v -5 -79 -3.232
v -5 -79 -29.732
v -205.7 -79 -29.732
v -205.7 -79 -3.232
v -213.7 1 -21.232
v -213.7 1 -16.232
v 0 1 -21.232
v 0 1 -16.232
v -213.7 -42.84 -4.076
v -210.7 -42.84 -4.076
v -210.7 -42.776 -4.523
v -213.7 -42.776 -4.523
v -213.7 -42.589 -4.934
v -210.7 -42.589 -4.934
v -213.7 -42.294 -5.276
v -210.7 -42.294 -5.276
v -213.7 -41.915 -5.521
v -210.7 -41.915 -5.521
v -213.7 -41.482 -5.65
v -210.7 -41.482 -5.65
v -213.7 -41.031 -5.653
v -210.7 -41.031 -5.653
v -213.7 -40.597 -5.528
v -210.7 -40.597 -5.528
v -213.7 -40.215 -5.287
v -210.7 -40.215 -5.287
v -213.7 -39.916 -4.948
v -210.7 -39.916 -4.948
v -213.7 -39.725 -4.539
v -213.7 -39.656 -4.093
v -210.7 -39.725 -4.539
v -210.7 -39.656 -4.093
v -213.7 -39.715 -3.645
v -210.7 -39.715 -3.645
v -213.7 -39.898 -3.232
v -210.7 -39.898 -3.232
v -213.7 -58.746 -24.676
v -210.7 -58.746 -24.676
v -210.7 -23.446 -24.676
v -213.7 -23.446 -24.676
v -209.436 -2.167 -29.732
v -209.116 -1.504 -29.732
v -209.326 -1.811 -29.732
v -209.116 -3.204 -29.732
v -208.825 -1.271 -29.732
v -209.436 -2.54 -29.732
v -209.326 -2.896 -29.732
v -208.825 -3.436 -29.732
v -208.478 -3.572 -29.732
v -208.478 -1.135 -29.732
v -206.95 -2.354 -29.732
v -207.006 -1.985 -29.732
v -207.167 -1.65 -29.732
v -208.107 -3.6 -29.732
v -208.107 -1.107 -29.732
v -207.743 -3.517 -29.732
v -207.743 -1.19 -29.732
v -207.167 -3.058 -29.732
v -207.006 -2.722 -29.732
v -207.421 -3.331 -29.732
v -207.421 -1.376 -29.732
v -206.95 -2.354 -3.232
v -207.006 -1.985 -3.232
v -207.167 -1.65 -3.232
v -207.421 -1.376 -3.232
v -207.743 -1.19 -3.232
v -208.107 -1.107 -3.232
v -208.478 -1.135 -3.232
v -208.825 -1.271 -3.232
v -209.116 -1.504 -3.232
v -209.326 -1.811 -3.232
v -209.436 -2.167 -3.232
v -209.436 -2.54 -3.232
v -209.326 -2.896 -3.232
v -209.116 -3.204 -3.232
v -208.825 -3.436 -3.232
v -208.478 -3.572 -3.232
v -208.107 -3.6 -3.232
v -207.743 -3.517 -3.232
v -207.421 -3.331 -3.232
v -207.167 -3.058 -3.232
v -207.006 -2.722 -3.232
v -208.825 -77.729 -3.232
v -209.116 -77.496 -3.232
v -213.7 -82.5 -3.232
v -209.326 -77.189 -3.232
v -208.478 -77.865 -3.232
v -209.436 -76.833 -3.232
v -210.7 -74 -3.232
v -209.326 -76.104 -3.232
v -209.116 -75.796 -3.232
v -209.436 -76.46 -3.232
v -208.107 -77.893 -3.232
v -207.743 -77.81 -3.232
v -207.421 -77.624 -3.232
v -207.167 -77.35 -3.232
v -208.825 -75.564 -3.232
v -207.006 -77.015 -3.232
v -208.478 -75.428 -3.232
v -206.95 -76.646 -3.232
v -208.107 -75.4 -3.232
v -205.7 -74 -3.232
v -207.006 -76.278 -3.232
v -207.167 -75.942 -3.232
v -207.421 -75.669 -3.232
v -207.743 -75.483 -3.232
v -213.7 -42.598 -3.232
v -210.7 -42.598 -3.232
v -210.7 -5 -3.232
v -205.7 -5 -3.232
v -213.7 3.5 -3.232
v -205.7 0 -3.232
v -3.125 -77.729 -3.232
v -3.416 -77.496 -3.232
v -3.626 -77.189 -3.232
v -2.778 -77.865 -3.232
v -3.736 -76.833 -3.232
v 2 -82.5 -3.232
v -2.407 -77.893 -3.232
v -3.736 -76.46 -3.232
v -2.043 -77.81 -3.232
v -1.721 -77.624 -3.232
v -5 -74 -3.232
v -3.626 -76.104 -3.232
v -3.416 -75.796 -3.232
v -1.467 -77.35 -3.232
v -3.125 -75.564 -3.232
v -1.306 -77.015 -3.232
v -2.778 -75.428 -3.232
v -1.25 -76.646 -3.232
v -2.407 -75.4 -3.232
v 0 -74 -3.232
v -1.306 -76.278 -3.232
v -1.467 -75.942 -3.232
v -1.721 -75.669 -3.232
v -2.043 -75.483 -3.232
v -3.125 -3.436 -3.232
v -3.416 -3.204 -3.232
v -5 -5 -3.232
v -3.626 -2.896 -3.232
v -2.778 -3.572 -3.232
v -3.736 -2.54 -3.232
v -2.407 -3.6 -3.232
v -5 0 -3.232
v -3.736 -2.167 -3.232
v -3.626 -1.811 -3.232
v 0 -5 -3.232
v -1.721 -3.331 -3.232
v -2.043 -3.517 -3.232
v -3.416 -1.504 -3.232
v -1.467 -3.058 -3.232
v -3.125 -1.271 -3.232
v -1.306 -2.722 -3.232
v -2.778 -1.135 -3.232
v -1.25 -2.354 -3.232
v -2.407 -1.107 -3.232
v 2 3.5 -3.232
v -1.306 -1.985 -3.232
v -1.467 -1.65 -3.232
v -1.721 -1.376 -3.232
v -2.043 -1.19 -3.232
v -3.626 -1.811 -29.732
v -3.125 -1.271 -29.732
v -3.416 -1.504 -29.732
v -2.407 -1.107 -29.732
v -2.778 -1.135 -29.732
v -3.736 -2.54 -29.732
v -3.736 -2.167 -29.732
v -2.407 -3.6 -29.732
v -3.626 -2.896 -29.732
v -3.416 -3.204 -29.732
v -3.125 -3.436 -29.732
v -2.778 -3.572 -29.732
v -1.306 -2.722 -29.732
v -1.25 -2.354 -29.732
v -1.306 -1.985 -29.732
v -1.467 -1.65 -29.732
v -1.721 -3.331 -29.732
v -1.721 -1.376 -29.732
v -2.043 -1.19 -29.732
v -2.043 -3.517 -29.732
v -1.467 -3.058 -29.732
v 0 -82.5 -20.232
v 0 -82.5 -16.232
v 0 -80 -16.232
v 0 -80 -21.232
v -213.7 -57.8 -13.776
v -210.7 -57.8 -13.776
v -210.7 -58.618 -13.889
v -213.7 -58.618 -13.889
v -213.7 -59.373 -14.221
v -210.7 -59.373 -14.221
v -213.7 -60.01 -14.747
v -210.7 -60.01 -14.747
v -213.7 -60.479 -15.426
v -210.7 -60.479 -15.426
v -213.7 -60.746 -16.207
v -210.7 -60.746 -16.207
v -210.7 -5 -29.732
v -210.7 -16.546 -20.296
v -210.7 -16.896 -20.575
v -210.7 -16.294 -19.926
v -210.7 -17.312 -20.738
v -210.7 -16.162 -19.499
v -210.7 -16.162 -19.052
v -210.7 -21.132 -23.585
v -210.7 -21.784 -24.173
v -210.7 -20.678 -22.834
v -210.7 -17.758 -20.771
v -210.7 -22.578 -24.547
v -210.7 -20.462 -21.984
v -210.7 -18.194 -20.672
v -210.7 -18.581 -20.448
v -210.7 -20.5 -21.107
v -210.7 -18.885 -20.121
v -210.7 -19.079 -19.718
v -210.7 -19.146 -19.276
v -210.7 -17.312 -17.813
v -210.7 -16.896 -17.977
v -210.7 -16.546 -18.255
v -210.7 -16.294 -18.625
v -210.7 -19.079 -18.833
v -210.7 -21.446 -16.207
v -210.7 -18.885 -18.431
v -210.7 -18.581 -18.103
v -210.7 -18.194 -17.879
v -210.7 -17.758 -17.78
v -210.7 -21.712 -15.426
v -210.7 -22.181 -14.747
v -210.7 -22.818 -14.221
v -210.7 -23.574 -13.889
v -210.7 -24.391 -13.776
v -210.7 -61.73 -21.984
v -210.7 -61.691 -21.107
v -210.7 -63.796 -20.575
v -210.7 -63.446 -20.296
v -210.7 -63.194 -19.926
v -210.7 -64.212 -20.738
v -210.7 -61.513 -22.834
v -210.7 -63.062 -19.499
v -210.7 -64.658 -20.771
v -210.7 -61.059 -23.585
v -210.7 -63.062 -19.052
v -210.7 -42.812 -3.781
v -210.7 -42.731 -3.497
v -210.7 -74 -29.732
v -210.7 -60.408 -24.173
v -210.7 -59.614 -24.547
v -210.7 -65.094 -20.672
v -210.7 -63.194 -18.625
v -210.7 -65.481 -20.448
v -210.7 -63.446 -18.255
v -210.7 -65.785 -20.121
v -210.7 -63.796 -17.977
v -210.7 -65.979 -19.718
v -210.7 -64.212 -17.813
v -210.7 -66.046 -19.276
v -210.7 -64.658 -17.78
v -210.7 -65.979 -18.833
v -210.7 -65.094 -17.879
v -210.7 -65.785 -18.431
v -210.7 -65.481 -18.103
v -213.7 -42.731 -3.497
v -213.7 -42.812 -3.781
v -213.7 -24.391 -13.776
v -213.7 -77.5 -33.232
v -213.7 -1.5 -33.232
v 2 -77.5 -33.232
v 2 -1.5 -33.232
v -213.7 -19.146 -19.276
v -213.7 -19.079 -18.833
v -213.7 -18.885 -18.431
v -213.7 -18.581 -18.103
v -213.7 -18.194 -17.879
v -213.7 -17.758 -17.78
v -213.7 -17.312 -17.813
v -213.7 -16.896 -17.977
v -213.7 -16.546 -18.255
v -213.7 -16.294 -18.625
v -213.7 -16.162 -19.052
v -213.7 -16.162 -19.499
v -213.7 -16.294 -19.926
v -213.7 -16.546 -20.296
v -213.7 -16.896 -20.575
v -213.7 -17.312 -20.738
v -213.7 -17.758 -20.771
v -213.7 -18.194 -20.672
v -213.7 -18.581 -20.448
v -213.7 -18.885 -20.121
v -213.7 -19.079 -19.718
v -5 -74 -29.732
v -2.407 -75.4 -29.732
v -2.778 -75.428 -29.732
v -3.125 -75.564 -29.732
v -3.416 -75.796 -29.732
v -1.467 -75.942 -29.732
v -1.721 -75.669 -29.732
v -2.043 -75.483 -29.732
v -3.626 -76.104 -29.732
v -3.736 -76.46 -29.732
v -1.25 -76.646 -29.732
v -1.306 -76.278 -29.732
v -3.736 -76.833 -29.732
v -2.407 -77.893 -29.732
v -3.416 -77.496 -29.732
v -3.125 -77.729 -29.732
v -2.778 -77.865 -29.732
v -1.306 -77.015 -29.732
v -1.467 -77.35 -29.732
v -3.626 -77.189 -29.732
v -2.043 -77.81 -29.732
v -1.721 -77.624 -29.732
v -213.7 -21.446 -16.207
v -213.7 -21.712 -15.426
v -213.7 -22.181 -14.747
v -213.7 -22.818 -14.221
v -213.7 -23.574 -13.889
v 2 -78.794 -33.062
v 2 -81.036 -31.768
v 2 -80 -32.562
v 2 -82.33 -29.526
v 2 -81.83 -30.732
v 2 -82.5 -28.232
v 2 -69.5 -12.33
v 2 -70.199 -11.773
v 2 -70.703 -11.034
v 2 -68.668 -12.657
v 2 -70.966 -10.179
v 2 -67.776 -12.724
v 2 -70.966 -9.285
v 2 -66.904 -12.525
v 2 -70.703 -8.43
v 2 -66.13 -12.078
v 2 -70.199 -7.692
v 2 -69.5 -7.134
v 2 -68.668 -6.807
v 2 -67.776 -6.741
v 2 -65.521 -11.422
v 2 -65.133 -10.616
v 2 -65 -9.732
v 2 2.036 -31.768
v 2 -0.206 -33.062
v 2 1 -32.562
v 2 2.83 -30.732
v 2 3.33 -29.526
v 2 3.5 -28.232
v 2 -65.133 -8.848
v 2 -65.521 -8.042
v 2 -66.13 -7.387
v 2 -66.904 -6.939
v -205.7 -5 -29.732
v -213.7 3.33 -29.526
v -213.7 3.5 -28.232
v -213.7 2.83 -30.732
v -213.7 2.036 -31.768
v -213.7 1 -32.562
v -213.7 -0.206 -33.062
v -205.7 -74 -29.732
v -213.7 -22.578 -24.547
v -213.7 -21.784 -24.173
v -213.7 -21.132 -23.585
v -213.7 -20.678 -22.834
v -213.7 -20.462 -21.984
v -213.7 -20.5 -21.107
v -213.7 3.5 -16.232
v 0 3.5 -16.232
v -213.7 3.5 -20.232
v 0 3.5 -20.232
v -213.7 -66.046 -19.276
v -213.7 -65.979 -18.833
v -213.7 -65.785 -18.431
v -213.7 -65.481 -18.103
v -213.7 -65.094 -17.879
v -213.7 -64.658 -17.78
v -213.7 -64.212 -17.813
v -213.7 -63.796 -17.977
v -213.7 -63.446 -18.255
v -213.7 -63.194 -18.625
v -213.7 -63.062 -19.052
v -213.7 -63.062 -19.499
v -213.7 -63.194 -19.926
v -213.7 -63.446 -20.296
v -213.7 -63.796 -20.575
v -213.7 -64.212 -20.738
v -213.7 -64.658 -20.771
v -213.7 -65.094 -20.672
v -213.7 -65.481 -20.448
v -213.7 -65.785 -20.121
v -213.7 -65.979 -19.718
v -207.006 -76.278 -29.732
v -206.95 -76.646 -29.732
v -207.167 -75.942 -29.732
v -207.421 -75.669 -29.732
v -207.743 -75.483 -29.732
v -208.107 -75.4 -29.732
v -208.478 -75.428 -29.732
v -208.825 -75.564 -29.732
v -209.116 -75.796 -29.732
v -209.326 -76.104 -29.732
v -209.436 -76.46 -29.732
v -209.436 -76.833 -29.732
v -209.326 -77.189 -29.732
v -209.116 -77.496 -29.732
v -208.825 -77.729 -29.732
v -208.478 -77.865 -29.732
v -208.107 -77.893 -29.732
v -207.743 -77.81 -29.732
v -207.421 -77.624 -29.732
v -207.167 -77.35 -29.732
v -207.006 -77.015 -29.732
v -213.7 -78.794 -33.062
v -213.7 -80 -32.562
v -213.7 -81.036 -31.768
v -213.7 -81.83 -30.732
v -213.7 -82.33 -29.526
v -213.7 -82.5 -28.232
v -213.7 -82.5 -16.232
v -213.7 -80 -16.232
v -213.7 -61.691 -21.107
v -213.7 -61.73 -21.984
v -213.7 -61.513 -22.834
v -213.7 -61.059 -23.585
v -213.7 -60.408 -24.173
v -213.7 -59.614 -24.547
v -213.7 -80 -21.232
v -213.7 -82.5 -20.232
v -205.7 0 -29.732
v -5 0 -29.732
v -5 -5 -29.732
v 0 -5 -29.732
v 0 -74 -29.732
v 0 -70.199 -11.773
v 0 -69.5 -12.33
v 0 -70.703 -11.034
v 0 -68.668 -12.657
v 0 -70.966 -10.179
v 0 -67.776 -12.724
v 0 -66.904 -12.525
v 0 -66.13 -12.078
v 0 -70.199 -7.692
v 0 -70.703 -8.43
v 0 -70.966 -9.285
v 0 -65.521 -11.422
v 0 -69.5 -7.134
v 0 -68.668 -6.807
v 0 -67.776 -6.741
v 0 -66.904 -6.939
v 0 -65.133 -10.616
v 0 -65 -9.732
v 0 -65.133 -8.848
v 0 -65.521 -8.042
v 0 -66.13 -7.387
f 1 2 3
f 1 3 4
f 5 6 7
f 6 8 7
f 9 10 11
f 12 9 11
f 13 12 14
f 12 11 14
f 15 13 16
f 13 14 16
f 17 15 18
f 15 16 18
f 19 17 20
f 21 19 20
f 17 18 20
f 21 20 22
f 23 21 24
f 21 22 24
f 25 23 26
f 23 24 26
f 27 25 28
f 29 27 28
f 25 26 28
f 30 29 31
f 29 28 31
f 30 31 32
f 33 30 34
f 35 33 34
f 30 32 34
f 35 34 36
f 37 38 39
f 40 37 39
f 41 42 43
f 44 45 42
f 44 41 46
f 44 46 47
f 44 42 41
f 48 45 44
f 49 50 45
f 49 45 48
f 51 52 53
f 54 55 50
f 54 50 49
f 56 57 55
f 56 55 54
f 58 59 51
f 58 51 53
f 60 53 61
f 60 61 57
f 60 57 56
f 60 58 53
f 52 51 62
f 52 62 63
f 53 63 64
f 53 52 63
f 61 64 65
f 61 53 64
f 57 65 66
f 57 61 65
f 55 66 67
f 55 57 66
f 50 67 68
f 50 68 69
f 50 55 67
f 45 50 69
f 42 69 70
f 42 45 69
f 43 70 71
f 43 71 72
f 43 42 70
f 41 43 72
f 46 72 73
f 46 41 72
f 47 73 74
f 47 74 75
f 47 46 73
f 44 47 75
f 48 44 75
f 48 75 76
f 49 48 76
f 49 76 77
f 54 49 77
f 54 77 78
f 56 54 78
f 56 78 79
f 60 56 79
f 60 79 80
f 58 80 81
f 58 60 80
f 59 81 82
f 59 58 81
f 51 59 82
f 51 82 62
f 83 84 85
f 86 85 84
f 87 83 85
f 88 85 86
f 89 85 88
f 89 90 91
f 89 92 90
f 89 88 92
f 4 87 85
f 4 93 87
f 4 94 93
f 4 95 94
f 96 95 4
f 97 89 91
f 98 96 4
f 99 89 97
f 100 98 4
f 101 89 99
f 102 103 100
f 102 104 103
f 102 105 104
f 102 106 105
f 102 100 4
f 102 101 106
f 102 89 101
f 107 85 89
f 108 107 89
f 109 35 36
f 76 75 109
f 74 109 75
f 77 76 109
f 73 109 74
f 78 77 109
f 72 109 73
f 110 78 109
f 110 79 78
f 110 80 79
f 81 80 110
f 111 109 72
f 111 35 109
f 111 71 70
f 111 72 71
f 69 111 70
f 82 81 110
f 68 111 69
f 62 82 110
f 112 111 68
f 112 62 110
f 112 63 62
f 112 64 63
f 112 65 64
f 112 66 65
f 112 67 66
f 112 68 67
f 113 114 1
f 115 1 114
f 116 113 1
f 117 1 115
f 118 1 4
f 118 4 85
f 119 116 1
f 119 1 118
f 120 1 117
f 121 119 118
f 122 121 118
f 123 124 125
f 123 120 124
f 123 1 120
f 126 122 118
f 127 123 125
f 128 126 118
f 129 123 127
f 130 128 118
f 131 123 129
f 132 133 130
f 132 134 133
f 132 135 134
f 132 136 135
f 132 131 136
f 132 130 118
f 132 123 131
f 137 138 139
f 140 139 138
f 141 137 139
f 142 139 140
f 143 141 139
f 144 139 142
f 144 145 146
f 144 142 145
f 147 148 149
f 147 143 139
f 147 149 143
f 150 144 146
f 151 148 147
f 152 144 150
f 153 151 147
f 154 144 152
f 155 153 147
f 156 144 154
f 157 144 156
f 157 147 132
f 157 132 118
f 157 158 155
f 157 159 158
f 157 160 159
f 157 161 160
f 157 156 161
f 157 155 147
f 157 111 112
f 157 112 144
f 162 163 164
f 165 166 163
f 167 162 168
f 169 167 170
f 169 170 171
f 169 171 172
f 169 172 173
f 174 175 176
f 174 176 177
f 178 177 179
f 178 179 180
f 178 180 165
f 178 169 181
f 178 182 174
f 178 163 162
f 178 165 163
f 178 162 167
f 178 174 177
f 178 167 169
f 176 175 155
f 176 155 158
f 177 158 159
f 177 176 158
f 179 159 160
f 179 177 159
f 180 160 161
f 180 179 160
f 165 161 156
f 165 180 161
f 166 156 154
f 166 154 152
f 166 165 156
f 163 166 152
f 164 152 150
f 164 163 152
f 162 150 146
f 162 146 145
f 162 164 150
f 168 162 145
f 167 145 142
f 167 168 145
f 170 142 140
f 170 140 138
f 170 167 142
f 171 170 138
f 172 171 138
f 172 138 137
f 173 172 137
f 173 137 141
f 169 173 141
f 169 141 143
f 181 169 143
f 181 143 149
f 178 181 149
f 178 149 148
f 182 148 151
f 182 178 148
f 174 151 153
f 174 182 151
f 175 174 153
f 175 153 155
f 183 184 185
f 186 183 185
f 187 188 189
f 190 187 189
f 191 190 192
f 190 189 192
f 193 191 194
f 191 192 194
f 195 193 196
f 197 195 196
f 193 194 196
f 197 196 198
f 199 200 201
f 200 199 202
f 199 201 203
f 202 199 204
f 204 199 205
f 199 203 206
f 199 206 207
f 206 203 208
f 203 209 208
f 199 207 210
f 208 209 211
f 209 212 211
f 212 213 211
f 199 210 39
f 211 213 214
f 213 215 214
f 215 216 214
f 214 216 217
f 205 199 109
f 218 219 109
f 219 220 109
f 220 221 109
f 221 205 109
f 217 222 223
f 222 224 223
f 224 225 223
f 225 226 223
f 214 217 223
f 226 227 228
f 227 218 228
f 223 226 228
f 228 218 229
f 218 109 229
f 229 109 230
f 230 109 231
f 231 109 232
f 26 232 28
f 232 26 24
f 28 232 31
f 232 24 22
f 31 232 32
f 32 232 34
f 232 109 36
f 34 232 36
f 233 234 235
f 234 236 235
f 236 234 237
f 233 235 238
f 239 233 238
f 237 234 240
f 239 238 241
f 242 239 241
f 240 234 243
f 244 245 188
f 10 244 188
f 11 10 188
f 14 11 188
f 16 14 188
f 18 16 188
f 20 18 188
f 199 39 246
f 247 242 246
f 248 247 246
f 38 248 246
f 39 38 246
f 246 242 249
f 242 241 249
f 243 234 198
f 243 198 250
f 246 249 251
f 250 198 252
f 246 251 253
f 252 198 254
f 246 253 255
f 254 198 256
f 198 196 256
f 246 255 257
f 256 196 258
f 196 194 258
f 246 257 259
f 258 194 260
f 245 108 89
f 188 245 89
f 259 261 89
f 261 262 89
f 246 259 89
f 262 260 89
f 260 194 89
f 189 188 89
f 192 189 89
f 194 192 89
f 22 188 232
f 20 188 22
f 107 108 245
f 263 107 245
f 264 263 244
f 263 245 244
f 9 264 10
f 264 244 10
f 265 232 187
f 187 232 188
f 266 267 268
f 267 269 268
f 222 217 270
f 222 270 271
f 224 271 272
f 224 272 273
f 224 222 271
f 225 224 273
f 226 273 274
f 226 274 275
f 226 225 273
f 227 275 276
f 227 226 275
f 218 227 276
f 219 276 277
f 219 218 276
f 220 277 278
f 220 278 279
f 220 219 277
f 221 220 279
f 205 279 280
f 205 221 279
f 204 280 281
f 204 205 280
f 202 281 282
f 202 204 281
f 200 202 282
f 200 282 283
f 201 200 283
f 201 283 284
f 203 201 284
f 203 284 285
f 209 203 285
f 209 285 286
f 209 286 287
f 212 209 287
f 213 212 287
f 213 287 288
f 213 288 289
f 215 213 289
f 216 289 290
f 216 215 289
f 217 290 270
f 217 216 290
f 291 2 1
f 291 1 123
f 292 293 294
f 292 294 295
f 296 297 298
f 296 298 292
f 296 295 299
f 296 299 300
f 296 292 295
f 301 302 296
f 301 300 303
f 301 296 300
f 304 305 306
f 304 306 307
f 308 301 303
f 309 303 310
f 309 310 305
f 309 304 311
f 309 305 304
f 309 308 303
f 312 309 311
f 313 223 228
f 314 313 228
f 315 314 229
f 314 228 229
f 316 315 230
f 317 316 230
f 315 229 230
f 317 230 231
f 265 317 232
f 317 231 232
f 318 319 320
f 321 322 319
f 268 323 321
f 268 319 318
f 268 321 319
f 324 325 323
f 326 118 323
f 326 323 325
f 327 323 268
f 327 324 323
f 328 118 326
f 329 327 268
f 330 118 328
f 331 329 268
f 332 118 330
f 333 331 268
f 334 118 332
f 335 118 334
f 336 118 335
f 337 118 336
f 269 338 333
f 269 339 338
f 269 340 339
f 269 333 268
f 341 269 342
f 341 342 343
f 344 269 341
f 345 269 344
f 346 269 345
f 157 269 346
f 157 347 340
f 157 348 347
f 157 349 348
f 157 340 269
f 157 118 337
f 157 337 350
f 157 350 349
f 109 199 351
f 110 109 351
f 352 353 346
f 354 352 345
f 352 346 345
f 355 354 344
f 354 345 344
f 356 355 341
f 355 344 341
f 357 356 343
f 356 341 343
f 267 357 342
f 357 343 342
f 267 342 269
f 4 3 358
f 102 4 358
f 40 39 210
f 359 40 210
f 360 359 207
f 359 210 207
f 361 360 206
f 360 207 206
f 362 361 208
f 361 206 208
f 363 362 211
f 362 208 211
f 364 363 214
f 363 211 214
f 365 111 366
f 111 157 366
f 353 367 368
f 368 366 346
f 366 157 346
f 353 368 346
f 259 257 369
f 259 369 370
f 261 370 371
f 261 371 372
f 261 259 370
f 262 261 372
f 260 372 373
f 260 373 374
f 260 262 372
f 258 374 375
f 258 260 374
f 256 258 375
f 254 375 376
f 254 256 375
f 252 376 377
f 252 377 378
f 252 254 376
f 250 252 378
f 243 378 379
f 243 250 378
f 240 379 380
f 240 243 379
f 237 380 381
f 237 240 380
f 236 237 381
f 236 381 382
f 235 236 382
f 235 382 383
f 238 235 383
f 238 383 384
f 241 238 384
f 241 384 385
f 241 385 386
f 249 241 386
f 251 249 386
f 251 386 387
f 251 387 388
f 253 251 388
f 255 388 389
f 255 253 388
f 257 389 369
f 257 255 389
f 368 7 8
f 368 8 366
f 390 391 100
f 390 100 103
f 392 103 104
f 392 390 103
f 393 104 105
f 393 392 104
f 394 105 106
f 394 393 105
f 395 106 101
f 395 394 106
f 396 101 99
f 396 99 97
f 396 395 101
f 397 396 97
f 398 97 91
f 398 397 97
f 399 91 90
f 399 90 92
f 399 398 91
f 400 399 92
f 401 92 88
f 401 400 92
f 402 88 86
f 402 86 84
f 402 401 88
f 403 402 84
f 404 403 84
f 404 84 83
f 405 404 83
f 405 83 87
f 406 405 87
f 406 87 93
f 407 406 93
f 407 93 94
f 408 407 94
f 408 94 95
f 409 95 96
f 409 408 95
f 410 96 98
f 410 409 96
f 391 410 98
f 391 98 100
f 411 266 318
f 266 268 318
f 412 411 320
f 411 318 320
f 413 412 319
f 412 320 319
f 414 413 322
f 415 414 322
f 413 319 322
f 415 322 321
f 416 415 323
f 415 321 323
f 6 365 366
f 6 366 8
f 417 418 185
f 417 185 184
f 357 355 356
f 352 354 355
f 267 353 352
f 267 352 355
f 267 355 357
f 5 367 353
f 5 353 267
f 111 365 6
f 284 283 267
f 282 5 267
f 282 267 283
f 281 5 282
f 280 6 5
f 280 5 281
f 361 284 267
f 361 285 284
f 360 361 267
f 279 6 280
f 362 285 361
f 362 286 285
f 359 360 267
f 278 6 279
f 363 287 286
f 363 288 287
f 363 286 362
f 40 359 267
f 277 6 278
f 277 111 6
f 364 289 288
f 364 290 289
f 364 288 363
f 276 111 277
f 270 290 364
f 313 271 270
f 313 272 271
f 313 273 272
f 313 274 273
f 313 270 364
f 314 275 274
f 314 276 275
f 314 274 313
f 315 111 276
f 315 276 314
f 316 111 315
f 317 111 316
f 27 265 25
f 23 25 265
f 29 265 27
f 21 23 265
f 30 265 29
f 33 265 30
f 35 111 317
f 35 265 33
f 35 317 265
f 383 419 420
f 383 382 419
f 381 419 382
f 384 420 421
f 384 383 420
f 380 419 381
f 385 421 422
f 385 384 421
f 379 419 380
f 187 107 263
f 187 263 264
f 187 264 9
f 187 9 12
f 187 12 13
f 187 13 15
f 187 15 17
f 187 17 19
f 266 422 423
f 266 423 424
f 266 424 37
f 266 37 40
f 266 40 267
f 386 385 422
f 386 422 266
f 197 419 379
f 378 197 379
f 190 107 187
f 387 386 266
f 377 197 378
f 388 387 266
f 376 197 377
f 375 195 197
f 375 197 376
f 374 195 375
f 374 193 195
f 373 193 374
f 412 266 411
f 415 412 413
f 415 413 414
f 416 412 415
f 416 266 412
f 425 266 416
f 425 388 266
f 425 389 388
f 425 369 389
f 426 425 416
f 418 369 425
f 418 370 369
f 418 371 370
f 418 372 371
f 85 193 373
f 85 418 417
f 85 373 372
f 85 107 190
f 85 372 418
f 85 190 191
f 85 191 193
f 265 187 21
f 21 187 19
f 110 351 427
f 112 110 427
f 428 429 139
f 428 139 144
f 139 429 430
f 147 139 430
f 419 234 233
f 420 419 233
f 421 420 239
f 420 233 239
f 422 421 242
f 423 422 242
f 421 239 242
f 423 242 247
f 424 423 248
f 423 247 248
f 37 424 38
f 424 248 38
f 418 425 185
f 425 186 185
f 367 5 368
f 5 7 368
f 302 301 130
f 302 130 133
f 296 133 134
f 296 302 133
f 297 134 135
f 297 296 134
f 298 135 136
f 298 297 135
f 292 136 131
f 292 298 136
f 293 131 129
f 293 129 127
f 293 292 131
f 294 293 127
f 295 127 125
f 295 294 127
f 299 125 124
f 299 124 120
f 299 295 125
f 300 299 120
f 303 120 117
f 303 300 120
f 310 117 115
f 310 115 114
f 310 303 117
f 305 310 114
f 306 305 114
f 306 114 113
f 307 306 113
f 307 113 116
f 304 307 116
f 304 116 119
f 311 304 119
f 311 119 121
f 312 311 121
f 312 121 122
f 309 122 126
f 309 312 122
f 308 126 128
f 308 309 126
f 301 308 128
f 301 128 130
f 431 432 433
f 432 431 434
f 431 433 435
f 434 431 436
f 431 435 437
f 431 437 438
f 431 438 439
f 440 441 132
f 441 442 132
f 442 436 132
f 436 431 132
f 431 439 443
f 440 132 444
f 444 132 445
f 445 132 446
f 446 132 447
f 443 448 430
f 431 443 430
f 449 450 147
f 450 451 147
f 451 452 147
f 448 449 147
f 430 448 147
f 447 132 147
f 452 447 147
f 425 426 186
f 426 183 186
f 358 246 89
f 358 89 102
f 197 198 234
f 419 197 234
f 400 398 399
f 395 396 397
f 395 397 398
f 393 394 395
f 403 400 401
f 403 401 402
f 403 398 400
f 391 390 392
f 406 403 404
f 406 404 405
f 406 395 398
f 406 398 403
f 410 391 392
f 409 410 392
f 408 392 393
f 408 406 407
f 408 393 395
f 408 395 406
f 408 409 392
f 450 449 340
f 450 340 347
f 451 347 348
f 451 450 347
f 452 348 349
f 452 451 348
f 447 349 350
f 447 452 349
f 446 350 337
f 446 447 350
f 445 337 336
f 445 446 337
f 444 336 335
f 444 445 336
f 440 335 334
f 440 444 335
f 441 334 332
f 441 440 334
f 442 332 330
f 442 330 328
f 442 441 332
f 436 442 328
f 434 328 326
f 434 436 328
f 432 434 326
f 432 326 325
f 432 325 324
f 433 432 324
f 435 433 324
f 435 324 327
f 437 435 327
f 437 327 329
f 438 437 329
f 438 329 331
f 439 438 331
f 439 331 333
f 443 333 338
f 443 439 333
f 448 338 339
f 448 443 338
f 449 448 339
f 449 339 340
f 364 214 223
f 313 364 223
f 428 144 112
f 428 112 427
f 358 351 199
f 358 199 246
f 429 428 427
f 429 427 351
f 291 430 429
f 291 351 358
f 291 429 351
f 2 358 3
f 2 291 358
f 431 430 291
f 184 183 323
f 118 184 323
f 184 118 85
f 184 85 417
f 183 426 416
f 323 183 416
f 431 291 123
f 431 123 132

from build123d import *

# Parameters (mm, degrees)
F1_DEPTH = 210.7
F0_W     = 79
F0_H     = 26.5
F0_R     = 3
F2_DEPTH = 2
F3_DEPTH = 2
F4_R     = 1.5
F5_DEPTH = 3
F6_W     = 5
F6_H     = 5
F6_R     = 1.25
F7_DEPTH = 26.5


with BuildPart() as f1:
    # F0 (on Right) → F1 (new body)
    with BuildSketch(Plane.YZ):
        with BuildLine():
            Line((-79, -29.7321164519), (-79, -3.2321164519))
            Line((-79, -3.2321164519), (-82.5, -3.2321164519))
            Line((-82.5, -3.2321164519), (-82.5, -16.2321164519))
            Line((-82.5, -16.2321164519), (-80, -16.2321164519))
            Line((-80, -16.2321164519), (-80, -21.2321164519))
            Line((-80, -21.2321164519), (-82.5, -20.2321164519))
            Line((-82.5, -20.2321164519), (-82.5, -28.2321164519))
            ThreePointArc((-82.5, -28.2321164519), (-81.0355339059, -31.7676503579), (-77.5, -33.2321164519))
            Line((-77.5, -33.2321164519), (-1.5, -33.2321164519))
            ThreePointArc((-1.5, -33.2321164519), (2.0355339059, -31.7676503579), (3.5, -28.2321164519))
            Line((3.5, -28.2321164519), (3.5, -20.2321164519))
            Line((3.5, -20.2321164519), (1, -21.2321164519))
            Line((1, -21.2321164519), (1, -16.2321164519))
            Line((1, -16.2321164519), (3.5, -16.2321164519))
            Line((3.5, -16.2321164519), (3.5, -3.2321164519))
            Line((3.5, -3.2321164519), (0, -3.2321164519))
            Line((0, -3.2321164519), (0, -29.7321164519))
            Line((0, -29.7321164519), (-79, -29.7321164519))
        make_face()
    extrude(amount=-F1_DEPTH)

    # F0 (on Right) → F2 (join)
    with BuildSketch(Plane.YZ):
        with Locations((-39.5, -16.4821164519)):
            Rectangle(F0_W, F0_H)
        with Locations((-68, -9.7321164519)):
            Circle(F0_R, mode=Mode.SUBTRACT)
        Polygon((-80, -16.2321164519), (-82.5, -16.2321164519), (-82.5, -20.2321164519), (-80, -21.2321164519), align=None)
        Polygon((3.5, -20.2321164519), (3.5, -16.2321164519), (1, -16.2321164519), (1, -21.2321164519), align=None)
    extrude(amount=F2_DEPTH)

    # F0 (on Right) → F3 (join, through all)
    with BuildSketch(Plane.YZ):
        with BuildLine():
            Line((-79, -29.7321164519), (-79, -3.2321164519))
            Line((-79, -3.2321164519), (-82.5, -3.2321164519))
            Line((-82.5, -3.2321164519), (-82.5, -16.2321164519))
            Line((-82.5, -16.2321164519), (-80, -16.2321164519))
            Line((-80, -16.2321164519), (-80, -21.2321164519))
            Line((-80, -21.2321164519), (-82.5, -20.2321164519))
            Line((-82.5, -20.2321164519), (-82.5, -28.2321164519))
            ThreePointArc((-82.5, -28.2321164519), (-81.0355339059, -31.7676503579), (-77.5, -33.2321164519))
            Line((-77.5, -33.2321164519), (-1.5, -33.2321164519))
            ThreePointArc((-1.5, -33.2321164519), (2.0355339059, -31.7676503579), (3.5, -28.2321164519))
            Line((3.5, -28.2321164519), (3.5, -20.2321164519))
            Line((3.5, -20.2321164519), (1, -21.2321164519))
            Line((1, -21.2321164519), (1, -16.2321164519))
            Line((1, -16.2321164519), (3.5, -16.2321164519))
            Line((3.5, -16.2321164519), (3.5, -3.2321164519))
            Line((3.5, -3.2321164519), (0, -3.2321164519))
            Line((0, -3.2321164519), (0, -29.7321164519))
            Line((0, -29.7321164519), (-79, -29.7321164519))
        make_face()
    extrude(amount=F3_DEPTH)

    # F4 (on face) → F5 (join)
    with BuildSketch(Plane(origin=(-210.7, 0, 0), x_dir=(0, -1, 0), z_dir=(-1, 0, 0))):
        with BuildLine():
            Line((39.8976451881, -3.2321164519), (0, -3.2321164519))
            Line((0, -3.2321164519), (0, -29.7321164519))
            Line((0, -29.7321164519), (79, -29.7321164519))
            Line((79, -29.7321164519), (79, -3.2321164519))
            Line((79, -3.2321164519), (42.5981824726, -3.2321164519))
            ThreePointArc((42.5981824726, -3.2321164519), (42.7783306428, -3.6368593662), (42.839971074, -4.0755741336))
            ThreePointArc((42.839971074, -4.0755741336), (40.809199063, -5.605990946), (39.8976451881, -3.2321164519))
        make_face()
        with Locations((17.6456464854, -19.2755741336)):
            Circle(F4_R, mode=Mode.SUBTRACT)
        with BuildLine():
            Line((20.5, -21.1070965323), (21.4456464854, -16.2070965323))
            ThreePointArc((21.4456464854, -16.2070965323), (22.4815067005, -14.4619803054), (24.3912929708, -13.7755741336))
            Line((24.3912929708, -13.7755741336), (57.8, -13.7755741336))
            ThreePointArc((57.8, -13.7755741336), (59.7097862703, -14.4619803054), (60.7456464854, -16.2070965323))
            Line((60.7456464854, -16.2070965323), (61.6912929708, -21.1070965323))
            ThreePointArc((61.6912929708, -21.1070965323), (61.0592403136, -23.5853604038), (58.7456464854, -24.6755741336))
            Line((58.7456464854, -24.6755741336), (23.4456464854, -24.6755741336))
            ThreePointArc((23.4456464854, -24.6755741336), (21.1320526572, -23.5853604038), (20.5, -21.1070965323))
        make_face(mode=Mode.SUBTRACT)
        with Locations((64.5456464854, -19.2755741336)):
            Circle(F4_R, mode=Mode.SUBTRACT)
        with BuildLine():
            Line((0, -3.2321164519), (-3.5, -3.2321164519))
            Line((-3.5, -3.2321164519), (-3.5, -16.2321164519))
            Line((-3.5, -16.2321164519), (-1, -16.2321164519))
            Line((-1, -16.2321164519), (-1, -21.2321164519))
            Line((-1, -21.2321164519), (-3.5, -20.2321164519))
            Line((-3.5, -20.2321164519), (-3.5, -28.2321164519))
            ThreePointArc((-3.5, -28.2321164519), (-2.0355339059, -31.7676503579), (1.5, -33.2321164519))
            Line((1.5, -33.2321164519), (77.5, -33.2321164519))
            ThreePointArc((77.5, -33.2321164519), (81.0355339059, -31.7676503579), (82.5, -28.2321164519))
            Line((82.5, -28.2321164519), (82.5, -20.2321164519))
            Line((82.5, -20.2321164519), (80, -21.2321164519))
            Line((80, -21.2321164519), (80, -16.2321164519))
            Line((80, -16.2321164519), (82.5, -16.2321164519))
            Line((82.5, -16.2321164519), (82.5, -3.2321164519))
            Line((82.5, -3.2321164519), (79, -3.2321164519))
            Line((79, -3.2321164519), (79, -29.7321164519))
            Line((79, -29.7321164519), (0, -29.7321164519))
            Line((0, -29.7321164519), (0, -3.2321164519))
        make_face()
    extrude(amount=F5_DEPTH)

    # F6 (on face) → F7 (join, through all)
    with BuildSketch(Plane.XY.offset(-29.7321164519)):
        with Locations((-2.5, -76.5)):
            Rectangle(F6_W, F6_H)
        with Locations((-2.5, -76.6462582126)):
            Circle(F6_R, mode=Mode.SUBTRACT)
        with Locations((-2.5, -2.5)):
            Rectangle(F6_W, F6_H)
        with Locations((-2.5, -2.3537417874)):
            Circle(F6_R, mode=Mode.SUBTRACT)
        with Locations((-208.2, -2.5)):
            Rectangle(F6_W, F6_H)
        with Locations((-208.2, -2.3537417874)):
            Circle(F6_R, mode=Mode.SUBTRACT)
        with Locations((-208.2, -76.5)):
            Rectangle(F6_W, F6_H)
        with Locations((-208.2, -76.6462582126)):
            Circle(F6_R, mode=Mode.SUBTRACT)
    extrude(amount=F7_DEPTH)


solid = f1.part
